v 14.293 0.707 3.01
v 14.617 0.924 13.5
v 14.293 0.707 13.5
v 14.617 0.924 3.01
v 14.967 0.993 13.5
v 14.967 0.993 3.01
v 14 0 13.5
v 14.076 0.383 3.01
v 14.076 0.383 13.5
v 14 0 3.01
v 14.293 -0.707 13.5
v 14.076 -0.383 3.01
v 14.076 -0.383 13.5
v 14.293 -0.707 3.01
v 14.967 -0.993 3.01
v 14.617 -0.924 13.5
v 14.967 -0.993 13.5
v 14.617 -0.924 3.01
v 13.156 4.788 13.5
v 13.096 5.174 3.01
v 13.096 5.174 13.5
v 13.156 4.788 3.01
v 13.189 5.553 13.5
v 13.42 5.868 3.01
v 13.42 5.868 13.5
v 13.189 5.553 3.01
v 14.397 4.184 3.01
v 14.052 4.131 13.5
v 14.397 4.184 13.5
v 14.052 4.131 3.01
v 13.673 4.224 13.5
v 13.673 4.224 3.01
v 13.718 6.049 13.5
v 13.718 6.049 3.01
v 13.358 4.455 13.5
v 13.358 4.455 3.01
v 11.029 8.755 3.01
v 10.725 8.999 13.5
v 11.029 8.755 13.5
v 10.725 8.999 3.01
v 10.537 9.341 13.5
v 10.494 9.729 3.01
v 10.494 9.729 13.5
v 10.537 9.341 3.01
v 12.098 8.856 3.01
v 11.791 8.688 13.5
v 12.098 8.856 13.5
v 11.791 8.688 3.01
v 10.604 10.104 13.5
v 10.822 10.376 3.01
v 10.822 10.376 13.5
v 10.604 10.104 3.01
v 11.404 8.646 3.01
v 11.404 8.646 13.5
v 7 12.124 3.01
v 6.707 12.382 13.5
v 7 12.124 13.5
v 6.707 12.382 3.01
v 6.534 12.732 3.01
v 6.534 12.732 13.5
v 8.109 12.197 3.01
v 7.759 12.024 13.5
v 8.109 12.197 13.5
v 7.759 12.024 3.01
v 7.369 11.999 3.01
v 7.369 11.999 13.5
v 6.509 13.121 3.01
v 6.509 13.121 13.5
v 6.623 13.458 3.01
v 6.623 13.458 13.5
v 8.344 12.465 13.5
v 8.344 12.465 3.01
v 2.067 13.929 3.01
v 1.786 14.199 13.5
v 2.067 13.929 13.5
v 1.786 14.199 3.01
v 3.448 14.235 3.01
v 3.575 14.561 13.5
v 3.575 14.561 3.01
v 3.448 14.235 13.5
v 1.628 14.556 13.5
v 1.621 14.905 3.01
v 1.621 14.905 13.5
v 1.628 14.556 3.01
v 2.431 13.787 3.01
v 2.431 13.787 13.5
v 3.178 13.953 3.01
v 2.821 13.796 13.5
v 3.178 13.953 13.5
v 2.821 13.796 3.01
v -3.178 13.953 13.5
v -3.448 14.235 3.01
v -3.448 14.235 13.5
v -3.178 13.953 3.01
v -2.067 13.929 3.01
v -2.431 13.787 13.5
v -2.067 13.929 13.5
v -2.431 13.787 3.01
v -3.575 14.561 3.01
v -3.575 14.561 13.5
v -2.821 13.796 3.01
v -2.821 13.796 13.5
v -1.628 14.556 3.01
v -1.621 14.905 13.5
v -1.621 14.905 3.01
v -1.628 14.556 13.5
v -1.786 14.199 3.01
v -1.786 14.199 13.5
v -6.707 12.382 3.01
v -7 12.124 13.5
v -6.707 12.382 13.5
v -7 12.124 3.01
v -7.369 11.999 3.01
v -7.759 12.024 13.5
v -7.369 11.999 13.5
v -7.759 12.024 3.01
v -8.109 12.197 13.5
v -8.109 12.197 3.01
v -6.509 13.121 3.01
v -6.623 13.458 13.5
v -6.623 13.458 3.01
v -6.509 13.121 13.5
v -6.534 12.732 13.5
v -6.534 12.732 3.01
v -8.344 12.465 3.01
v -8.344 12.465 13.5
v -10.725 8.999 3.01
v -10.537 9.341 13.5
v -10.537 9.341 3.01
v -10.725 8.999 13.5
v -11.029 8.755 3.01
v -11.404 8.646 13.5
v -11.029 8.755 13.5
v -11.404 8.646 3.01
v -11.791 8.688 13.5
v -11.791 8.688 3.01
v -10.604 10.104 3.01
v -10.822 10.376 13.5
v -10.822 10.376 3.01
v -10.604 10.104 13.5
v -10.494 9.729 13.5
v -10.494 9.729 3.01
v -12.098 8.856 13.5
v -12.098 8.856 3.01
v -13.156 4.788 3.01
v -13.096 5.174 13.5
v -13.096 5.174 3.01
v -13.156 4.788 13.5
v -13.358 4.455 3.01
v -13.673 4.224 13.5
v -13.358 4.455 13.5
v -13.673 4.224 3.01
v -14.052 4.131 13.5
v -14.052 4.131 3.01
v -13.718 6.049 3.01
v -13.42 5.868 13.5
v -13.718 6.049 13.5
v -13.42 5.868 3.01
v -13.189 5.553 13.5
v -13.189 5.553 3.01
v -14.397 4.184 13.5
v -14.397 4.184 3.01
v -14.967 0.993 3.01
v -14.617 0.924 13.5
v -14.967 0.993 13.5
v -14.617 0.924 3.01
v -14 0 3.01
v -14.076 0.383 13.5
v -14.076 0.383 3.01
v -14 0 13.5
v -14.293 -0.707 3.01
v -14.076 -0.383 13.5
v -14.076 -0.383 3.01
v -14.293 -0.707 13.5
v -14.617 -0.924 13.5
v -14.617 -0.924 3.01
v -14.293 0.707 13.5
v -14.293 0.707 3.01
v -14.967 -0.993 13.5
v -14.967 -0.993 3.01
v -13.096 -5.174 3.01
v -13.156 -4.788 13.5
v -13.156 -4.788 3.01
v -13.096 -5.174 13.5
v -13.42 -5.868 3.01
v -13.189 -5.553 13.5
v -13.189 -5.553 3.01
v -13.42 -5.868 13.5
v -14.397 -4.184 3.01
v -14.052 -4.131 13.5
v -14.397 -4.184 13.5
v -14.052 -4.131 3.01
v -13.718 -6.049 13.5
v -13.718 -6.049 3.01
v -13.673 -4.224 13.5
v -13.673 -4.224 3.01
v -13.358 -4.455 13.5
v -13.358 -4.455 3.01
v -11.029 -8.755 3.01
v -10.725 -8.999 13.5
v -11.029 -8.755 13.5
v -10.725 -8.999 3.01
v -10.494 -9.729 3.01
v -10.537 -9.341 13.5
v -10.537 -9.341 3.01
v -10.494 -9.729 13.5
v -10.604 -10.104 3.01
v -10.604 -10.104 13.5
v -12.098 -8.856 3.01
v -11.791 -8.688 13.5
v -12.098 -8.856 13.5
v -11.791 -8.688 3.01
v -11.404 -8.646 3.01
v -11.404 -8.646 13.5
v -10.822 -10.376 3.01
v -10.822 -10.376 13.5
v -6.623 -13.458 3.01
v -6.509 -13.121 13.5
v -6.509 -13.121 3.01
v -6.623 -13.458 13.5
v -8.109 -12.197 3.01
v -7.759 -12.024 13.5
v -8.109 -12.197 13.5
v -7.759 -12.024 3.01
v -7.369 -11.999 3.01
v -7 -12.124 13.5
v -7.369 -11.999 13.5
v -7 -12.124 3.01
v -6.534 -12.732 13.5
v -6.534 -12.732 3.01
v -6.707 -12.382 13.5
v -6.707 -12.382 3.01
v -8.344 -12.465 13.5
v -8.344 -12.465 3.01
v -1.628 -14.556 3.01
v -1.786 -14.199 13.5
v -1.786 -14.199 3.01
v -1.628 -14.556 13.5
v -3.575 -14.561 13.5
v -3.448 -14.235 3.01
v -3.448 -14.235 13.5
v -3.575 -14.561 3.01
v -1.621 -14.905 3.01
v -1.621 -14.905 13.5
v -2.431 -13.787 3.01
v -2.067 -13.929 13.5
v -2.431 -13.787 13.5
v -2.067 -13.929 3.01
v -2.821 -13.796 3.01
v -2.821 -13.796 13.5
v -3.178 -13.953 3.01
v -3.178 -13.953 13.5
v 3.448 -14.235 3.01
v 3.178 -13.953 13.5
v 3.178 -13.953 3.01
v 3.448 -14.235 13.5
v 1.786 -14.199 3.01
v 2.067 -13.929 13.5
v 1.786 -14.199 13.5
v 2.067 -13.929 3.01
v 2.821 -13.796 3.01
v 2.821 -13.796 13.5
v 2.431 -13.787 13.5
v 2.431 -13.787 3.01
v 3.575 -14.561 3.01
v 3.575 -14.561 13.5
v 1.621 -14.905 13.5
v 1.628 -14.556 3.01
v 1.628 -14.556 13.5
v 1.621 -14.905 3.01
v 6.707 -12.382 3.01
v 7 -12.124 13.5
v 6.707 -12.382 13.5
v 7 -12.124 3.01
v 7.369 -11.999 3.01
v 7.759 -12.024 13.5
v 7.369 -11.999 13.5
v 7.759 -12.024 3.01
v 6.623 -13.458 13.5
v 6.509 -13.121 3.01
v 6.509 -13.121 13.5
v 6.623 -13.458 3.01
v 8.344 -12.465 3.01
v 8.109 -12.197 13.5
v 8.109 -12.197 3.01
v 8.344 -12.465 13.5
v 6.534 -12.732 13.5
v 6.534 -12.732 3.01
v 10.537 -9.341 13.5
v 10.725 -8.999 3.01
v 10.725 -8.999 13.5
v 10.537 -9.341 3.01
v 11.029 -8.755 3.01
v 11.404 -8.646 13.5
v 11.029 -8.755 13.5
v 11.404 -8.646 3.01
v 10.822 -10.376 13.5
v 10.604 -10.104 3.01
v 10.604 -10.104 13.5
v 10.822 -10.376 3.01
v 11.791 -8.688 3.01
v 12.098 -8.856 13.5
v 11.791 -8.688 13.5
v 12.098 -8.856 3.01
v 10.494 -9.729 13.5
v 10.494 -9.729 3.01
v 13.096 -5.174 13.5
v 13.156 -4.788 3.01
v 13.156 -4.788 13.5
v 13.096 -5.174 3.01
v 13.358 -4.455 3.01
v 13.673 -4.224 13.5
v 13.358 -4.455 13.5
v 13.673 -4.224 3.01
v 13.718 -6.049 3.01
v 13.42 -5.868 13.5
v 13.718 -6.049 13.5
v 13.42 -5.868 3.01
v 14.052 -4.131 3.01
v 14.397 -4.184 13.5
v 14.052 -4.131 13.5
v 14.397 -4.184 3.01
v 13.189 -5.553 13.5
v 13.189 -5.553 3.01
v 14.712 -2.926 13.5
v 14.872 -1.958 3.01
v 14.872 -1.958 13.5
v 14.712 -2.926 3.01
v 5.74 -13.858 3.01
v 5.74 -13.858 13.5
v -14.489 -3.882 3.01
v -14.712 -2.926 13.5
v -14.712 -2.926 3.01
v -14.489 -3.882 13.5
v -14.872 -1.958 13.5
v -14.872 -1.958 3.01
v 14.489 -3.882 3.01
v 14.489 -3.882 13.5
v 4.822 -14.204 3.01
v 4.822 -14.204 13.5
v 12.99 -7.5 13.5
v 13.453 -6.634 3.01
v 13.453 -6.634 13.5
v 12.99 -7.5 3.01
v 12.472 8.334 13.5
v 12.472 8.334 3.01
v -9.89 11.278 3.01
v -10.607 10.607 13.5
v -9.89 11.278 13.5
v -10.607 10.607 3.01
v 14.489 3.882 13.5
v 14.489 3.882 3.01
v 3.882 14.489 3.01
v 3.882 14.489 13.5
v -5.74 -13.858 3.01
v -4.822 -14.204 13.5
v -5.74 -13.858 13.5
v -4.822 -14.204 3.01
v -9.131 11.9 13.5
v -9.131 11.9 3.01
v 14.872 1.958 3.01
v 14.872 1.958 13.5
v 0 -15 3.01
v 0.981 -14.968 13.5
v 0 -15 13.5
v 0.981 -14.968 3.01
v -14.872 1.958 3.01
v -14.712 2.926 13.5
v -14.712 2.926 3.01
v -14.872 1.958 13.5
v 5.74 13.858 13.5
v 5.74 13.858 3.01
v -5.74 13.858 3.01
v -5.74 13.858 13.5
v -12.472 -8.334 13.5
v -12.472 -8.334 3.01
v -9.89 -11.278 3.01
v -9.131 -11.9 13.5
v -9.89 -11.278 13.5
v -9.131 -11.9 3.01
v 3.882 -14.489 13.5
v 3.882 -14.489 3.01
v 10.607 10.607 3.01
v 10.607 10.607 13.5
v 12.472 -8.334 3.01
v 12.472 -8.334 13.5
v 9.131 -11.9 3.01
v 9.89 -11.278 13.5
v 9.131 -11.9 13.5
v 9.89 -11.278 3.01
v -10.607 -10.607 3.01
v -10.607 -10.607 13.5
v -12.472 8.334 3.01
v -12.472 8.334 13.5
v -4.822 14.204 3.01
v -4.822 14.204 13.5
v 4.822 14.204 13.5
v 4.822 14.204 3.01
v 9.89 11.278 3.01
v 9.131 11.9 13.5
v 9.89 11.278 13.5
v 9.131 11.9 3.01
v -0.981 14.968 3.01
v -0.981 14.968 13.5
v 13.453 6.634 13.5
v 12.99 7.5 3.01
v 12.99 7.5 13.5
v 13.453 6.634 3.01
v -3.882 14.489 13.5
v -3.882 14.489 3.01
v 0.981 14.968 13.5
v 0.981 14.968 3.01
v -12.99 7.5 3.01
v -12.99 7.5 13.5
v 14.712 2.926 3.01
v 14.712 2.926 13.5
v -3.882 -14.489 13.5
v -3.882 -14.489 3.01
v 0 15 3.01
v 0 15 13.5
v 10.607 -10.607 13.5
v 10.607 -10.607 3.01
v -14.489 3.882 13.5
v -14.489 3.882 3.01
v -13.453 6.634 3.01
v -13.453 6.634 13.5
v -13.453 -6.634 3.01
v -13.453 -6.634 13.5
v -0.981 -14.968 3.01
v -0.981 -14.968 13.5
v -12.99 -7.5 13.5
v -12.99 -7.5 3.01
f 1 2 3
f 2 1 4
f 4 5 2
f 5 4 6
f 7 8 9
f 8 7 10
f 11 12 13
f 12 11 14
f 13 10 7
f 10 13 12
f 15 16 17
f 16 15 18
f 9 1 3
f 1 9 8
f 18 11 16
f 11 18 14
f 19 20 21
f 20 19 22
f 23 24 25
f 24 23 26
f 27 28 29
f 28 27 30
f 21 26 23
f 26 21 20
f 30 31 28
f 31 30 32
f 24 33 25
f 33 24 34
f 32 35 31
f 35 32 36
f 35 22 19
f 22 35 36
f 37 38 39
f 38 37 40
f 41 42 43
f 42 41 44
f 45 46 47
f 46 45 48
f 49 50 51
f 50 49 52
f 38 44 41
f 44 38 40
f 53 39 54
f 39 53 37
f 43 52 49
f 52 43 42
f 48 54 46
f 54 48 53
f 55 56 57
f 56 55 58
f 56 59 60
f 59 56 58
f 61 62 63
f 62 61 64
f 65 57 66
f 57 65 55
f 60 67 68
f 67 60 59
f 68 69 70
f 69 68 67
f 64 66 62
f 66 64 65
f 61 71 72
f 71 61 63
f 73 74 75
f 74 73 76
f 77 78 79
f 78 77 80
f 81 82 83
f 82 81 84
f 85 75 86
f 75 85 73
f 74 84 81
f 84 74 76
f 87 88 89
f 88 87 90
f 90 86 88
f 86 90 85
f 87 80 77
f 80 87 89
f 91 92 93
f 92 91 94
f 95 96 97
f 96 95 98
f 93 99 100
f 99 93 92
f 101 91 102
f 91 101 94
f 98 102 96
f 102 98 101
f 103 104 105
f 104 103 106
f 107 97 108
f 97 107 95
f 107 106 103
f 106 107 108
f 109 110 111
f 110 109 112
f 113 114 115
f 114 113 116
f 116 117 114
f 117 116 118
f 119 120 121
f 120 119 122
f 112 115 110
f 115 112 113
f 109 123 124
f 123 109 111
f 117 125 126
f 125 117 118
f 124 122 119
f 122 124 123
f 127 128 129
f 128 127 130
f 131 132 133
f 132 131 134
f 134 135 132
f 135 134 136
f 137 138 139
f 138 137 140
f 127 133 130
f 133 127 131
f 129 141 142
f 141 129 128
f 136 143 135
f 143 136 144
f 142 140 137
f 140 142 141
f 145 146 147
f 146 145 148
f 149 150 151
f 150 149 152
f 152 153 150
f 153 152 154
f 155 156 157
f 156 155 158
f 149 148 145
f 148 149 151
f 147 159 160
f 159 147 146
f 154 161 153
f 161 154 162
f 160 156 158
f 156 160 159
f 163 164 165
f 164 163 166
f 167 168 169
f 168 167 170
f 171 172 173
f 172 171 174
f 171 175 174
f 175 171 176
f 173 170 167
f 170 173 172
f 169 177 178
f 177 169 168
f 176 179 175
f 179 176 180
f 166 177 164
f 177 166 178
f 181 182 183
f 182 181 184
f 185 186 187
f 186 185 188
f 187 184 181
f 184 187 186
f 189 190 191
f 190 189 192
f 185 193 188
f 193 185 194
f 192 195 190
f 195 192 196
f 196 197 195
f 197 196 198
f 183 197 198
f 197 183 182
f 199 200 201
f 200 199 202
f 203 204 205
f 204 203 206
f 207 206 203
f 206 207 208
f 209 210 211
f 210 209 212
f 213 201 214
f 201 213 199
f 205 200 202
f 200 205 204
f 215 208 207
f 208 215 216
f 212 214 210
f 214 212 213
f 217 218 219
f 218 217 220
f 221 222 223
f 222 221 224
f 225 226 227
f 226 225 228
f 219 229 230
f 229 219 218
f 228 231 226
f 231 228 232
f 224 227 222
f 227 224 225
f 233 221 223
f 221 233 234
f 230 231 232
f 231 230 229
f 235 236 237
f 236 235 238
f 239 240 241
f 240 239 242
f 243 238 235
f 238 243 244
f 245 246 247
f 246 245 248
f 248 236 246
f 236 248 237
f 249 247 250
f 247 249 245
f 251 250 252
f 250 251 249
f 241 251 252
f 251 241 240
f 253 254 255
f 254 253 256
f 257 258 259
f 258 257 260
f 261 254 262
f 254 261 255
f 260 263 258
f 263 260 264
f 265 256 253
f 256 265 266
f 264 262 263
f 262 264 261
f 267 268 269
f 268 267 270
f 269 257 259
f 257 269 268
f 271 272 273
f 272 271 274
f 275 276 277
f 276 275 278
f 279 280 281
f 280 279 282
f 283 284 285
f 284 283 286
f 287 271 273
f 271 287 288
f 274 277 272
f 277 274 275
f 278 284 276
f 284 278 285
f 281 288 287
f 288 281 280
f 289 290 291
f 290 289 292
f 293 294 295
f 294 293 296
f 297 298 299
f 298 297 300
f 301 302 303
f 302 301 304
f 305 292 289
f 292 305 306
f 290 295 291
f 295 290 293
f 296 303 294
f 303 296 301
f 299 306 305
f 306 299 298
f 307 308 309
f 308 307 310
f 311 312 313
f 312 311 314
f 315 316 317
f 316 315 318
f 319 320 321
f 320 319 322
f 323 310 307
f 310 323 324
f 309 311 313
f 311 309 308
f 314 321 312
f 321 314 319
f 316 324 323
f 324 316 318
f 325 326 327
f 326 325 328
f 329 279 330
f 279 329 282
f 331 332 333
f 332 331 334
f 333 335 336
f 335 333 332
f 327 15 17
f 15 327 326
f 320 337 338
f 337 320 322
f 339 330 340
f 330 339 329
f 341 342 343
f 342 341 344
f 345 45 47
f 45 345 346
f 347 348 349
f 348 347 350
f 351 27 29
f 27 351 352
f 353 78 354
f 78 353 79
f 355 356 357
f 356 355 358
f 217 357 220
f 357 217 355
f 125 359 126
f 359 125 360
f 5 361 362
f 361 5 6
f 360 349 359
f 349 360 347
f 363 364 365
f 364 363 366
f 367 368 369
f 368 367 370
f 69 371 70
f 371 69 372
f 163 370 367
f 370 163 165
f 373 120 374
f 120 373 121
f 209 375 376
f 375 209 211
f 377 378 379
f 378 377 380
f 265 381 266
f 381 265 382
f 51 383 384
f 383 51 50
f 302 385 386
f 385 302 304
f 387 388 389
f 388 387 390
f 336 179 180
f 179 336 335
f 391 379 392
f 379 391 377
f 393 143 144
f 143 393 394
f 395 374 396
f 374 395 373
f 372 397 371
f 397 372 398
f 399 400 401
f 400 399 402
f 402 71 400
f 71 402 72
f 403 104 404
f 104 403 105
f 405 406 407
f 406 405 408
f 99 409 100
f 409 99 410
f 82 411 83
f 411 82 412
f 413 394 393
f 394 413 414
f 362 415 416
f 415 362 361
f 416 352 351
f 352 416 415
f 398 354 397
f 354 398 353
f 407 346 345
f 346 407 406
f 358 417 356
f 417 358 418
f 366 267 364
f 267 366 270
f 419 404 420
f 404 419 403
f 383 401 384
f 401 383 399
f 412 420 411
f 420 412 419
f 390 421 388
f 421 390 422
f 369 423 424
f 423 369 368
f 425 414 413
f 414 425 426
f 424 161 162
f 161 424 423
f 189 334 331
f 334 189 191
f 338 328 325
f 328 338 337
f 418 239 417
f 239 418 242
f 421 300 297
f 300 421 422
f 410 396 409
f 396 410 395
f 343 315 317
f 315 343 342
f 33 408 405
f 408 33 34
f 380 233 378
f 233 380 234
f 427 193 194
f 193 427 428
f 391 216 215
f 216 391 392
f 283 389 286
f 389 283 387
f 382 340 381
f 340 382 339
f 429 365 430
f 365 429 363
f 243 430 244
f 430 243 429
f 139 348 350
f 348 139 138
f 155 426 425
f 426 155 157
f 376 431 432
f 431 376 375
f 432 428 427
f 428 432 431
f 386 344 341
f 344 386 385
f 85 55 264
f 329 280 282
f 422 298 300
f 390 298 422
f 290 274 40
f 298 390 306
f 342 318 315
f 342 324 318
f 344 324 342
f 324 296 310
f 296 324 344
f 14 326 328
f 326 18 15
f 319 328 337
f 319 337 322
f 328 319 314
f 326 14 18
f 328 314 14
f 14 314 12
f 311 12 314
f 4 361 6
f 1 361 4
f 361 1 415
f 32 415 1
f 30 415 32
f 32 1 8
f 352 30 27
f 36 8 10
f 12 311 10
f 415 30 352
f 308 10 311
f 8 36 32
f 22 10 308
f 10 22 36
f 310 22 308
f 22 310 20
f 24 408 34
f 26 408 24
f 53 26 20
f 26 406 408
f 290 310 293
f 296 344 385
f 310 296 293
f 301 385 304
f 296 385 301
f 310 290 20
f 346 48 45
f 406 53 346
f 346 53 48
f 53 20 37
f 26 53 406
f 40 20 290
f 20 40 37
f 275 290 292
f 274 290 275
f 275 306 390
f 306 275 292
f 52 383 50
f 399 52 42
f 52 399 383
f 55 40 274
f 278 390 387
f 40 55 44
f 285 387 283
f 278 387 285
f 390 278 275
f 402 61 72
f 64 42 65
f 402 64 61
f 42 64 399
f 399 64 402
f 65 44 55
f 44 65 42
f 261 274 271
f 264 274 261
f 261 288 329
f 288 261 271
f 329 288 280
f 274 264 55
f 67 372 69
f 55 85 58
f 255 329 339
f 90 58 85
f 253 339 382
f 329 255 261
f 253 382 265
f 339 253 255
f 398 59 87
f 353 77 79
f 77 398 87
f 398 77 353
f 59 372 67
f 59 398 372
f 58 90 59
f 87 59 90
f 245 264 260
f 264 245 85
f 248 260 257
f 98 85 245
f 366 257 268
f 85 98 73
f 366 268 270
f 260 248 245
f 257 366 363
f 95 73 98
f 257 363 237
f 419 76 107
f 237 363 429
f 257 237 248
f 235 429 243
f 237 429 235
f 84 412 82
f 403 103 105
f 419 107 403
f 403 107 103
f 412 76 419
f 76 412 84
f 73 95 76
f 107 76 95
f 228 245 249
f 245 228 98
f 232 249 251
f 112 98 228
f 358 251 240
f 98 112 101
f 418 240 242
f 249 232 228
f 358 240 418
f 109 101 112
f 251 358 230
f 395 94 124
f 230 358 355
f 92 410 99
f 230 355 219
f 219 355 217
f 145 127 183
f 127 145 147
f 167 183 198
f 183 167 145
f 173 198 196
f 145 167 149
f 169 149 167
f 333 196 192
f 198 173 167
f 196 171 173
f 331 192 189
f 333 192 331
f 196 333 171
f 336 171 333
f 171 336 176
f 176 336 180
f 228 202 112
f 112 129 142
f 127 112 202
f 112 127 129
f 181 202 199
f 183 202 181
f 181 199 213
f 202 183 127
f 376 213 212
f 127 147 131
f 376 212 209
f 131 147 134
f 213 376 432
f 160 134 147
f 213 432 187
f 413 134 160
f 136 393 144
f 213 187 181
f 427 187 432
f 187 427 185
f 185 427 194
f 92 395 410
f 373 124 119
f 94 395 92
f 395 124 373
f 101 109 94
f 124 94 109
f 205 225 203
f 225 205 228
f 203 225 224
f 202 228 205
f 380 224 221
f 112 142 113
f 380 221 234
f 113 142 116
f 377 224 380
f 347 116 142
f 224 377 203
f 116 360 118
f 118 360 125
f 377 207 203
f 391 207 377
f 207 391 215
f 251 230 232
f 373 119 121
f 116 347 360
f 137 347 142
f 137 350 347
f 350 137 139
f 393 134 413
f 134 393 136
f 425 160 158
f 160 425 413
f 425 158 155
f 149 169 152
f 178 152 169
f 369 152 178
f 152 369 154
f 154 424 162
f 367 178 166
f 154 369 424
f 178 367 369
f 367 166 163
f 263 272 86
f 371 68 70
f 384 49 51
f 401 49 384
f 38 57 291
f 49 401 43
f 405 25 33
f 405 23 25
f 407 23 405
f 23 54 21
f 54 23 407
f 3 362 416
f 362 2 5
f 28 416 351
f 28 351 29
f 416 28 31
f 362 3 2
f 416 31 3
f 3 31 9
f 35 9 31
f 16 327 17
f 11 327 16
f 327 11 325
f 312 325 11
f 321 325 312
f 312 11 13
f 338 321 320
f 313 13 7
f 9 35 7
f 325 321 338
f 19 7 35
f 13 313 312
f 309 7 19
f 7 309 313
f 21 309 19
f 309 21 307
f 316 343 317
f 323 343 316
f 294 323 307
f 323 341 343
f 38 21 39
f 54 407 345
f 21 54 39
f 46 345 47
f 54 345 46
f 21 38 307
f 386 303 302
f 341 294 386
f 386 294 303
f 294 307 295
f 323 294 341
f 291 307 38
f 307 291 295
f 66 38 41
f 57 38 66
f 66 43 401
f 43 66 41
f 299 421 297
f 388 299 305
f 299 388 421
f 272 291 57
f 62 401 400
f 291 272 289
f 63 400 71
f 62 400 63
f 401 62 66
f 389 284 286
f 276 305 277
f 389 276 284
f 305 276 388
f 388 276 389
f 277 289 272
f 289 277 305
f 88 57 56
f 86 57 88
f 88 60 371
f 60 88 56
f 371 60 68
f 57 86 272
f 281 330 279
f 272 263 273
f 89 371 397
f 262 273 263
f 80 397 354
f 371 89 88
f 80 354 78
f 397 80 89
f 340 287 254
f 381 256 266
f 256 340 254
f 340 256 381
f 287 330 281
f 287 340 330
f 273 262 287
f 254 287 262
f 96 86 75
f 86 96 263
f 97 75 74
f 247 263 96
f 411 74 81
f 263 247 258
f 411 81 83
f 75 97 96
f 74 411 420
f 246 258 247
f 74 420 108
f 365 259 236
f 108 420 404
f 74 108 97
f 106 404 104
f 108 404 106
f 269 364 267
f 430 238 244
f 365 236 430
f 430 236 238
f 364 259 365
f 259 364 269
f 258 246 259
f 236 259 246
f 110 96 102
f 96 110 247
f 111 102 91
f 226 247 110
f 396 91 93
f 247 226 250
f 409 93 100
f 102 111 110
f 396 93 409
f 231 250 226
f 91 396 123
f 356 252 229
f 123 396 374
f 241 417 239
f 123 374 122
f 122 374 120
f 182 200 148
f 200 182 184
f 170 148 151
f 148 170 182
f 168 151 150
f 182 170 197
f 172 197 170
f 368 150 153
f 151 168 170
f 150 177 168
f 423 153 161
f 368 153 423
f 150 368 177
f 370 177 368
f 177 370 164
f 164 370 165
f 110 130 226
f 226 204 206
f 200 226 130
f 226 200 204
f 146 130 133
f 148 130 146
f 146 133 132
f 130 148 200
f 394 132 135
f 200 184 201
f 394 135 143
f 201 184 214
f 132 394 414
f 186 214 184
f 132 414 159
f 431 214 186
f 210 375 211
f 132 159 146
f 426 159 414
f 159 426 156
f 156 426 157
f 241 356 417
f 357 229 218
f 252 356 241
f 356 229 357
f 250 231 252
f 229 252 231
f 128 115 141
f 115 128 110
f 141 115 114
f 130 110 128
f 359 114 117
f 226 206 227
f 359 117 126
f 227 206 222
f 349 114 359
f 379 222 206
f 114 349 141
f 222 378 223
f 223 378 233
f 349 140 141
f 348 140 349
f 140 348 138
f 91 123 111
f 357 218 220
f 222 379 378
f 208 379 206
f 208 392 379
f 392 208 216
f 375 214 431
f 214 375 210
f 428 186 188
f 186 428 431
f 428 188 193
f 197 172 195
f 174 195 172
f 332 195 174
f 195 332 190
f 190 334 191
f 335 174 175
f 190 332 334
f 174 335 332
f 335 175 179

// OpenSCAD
// Replacement knob for a hotplate stirrer - a cylinder with a D-shaped blind bore and a
// pointer groove, and with a ring of grip grooves around the outside. NOVEL general part.
//

bottom   = 30;
height   = 15;
shaft_d  = 6.2;
flat     = 4.7;
grooves  = 18;
pointer  = 1.5;

$fn = 96;

fd = bottom;                 // outer diameter (circle)
fl = flat / 2;              // how far the D-flat extends past the circle centre
fl2 = fl * 2;               // full width of the flat cut

difference() {
    cylinder(h = height, d = fd);
    translate([0, 0, 0])
        cylinder(h = height - 12 + 0.01, d = fd, $fn = 96);                 // bottom face, 1.5 mm above bed
    translate([0, 0, height - 1.5])
        cylinder(h = 1.5, d = fd, $fn = 96);                                // top face, 1.5 mm below the top edge
    // D-shaped blind bore: a circle with one side cut flat, 12 mm deep
    translate([0, 0, 0])
        cylinder(h = height - 12 + 0.01, d = shaft_d, $fn = 96);
    translate([0, -fl2 / 2, 0])
        cube(h = height - 12 + 0.01, d = [shaft_d, fl2, 1]);               // flat the D
    // ring of grip grooves: a 2 mm diameter half-cylinder, centred on the outer surface,
    // 18 times around
    for (i = [0 : grooves - 1])
        rotate([0, 0, i * 360 / grooves])
            translate([fd / 2, 0, 0])
                cylinder(h = height, d = 2, $fn = 16);
    // pointer groove: a 1.5 mm wide, 1 mm deep slot running from the centre to the outer
    // edge, on the same side as the flat of the D
    translate([0, -fl2 / 2, 0])
        cube(h = height, d = [pointer, fl2, 1]);
}
